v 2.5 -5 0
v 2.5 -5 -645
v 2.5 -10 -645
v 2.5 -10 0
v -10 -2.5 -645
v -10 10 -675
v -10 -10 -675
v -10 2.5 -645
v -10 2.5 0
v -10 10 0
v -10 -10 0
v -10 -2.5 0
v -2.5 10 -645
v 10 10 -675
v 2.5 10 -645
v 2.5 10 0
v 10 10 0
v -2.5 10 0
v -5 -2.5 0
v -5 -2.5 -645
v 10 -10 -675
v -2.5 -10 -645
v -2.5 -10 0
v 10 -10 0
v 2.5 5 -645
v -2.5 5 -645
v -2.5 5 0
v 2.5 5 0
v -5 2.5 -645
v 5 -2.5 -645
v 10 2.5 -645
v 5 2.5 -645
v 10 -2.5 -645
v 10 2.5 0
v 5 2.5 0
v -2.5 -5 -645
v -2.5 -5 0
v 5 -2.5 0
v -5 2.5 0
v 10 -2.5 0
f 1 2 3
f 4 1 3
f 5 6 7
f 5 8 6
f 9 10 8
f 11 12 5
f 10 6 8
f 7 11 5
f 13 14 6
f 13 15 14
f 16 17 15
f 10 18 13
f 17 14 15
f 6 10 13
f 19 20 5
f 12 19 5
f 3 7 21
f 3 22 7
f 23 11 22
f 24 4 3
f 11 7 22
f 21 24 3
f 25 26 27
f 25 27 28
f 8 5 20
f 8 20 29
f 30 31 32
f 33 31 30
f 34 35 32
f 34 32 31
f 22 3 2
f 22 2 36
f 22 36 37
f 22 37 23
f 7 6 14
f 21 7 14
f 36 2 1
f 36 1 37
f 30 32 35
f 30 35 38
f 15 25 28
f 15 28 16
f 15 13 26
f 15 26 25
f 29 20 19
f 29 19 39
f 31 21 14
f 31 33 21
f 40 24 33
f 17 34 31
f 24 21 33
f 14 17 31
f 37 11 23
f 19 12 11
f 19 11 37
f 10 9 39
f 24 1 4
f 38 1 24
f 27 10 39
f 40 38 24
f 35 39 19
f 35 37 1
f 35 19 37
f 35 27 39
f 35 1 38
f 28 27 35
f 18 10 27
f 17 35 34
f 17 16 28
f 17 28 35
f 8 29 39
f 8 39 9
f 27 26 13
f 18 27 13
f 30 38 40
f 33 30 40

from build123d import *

# Parameters (mm, degrees)
SKETCH1_W           = 20
SKETCH1_H           = 20
BOSS_EXTRUDE1_DEPTH = 675
SKETCH1_3_W         = 5
SKETCH1_3_H         = 10
CUT_EXTRUDE1_DEPTH  = 645
CIRPATTERN1_COUNT   = 4


with BuildPart() as part:
    # Sketch1 → Boss-Extrude1 (new body)
    with BuildSketch(Plane.XY):
        Rectangle(SKETCH1_W, SKETCH1_H)
    extrude(amount=-BOSS_EXTRUDE1_DEPTH)

    # Sketch1<3> → Cut-Extrude1 (cut)
    with BuildSketch(Plane.XY):
        with Locations((0, 10)):
            Rectangle(SKETCH1_3_W, SKETCH1_3_H)
    cut_extrude1 = extrude(amount=-CUT_EXTRUDE1_DEPTH, mode=Mode.SUBTRACT)

    # CirPattern1: Cut-Extrude1 ×4 about axis
    cirpattern1_axis = Axis((0, 0, 32.25), (0, 0, -1))
    for i in range(1, CIRPATTERN1_COUNT):
        add(cut_extrude1.rotate(cirpattern1_axis, i * 360 / CIRPATTERN1_COUNT), mode=Mode.SUBTRACT)


solid = part.part
